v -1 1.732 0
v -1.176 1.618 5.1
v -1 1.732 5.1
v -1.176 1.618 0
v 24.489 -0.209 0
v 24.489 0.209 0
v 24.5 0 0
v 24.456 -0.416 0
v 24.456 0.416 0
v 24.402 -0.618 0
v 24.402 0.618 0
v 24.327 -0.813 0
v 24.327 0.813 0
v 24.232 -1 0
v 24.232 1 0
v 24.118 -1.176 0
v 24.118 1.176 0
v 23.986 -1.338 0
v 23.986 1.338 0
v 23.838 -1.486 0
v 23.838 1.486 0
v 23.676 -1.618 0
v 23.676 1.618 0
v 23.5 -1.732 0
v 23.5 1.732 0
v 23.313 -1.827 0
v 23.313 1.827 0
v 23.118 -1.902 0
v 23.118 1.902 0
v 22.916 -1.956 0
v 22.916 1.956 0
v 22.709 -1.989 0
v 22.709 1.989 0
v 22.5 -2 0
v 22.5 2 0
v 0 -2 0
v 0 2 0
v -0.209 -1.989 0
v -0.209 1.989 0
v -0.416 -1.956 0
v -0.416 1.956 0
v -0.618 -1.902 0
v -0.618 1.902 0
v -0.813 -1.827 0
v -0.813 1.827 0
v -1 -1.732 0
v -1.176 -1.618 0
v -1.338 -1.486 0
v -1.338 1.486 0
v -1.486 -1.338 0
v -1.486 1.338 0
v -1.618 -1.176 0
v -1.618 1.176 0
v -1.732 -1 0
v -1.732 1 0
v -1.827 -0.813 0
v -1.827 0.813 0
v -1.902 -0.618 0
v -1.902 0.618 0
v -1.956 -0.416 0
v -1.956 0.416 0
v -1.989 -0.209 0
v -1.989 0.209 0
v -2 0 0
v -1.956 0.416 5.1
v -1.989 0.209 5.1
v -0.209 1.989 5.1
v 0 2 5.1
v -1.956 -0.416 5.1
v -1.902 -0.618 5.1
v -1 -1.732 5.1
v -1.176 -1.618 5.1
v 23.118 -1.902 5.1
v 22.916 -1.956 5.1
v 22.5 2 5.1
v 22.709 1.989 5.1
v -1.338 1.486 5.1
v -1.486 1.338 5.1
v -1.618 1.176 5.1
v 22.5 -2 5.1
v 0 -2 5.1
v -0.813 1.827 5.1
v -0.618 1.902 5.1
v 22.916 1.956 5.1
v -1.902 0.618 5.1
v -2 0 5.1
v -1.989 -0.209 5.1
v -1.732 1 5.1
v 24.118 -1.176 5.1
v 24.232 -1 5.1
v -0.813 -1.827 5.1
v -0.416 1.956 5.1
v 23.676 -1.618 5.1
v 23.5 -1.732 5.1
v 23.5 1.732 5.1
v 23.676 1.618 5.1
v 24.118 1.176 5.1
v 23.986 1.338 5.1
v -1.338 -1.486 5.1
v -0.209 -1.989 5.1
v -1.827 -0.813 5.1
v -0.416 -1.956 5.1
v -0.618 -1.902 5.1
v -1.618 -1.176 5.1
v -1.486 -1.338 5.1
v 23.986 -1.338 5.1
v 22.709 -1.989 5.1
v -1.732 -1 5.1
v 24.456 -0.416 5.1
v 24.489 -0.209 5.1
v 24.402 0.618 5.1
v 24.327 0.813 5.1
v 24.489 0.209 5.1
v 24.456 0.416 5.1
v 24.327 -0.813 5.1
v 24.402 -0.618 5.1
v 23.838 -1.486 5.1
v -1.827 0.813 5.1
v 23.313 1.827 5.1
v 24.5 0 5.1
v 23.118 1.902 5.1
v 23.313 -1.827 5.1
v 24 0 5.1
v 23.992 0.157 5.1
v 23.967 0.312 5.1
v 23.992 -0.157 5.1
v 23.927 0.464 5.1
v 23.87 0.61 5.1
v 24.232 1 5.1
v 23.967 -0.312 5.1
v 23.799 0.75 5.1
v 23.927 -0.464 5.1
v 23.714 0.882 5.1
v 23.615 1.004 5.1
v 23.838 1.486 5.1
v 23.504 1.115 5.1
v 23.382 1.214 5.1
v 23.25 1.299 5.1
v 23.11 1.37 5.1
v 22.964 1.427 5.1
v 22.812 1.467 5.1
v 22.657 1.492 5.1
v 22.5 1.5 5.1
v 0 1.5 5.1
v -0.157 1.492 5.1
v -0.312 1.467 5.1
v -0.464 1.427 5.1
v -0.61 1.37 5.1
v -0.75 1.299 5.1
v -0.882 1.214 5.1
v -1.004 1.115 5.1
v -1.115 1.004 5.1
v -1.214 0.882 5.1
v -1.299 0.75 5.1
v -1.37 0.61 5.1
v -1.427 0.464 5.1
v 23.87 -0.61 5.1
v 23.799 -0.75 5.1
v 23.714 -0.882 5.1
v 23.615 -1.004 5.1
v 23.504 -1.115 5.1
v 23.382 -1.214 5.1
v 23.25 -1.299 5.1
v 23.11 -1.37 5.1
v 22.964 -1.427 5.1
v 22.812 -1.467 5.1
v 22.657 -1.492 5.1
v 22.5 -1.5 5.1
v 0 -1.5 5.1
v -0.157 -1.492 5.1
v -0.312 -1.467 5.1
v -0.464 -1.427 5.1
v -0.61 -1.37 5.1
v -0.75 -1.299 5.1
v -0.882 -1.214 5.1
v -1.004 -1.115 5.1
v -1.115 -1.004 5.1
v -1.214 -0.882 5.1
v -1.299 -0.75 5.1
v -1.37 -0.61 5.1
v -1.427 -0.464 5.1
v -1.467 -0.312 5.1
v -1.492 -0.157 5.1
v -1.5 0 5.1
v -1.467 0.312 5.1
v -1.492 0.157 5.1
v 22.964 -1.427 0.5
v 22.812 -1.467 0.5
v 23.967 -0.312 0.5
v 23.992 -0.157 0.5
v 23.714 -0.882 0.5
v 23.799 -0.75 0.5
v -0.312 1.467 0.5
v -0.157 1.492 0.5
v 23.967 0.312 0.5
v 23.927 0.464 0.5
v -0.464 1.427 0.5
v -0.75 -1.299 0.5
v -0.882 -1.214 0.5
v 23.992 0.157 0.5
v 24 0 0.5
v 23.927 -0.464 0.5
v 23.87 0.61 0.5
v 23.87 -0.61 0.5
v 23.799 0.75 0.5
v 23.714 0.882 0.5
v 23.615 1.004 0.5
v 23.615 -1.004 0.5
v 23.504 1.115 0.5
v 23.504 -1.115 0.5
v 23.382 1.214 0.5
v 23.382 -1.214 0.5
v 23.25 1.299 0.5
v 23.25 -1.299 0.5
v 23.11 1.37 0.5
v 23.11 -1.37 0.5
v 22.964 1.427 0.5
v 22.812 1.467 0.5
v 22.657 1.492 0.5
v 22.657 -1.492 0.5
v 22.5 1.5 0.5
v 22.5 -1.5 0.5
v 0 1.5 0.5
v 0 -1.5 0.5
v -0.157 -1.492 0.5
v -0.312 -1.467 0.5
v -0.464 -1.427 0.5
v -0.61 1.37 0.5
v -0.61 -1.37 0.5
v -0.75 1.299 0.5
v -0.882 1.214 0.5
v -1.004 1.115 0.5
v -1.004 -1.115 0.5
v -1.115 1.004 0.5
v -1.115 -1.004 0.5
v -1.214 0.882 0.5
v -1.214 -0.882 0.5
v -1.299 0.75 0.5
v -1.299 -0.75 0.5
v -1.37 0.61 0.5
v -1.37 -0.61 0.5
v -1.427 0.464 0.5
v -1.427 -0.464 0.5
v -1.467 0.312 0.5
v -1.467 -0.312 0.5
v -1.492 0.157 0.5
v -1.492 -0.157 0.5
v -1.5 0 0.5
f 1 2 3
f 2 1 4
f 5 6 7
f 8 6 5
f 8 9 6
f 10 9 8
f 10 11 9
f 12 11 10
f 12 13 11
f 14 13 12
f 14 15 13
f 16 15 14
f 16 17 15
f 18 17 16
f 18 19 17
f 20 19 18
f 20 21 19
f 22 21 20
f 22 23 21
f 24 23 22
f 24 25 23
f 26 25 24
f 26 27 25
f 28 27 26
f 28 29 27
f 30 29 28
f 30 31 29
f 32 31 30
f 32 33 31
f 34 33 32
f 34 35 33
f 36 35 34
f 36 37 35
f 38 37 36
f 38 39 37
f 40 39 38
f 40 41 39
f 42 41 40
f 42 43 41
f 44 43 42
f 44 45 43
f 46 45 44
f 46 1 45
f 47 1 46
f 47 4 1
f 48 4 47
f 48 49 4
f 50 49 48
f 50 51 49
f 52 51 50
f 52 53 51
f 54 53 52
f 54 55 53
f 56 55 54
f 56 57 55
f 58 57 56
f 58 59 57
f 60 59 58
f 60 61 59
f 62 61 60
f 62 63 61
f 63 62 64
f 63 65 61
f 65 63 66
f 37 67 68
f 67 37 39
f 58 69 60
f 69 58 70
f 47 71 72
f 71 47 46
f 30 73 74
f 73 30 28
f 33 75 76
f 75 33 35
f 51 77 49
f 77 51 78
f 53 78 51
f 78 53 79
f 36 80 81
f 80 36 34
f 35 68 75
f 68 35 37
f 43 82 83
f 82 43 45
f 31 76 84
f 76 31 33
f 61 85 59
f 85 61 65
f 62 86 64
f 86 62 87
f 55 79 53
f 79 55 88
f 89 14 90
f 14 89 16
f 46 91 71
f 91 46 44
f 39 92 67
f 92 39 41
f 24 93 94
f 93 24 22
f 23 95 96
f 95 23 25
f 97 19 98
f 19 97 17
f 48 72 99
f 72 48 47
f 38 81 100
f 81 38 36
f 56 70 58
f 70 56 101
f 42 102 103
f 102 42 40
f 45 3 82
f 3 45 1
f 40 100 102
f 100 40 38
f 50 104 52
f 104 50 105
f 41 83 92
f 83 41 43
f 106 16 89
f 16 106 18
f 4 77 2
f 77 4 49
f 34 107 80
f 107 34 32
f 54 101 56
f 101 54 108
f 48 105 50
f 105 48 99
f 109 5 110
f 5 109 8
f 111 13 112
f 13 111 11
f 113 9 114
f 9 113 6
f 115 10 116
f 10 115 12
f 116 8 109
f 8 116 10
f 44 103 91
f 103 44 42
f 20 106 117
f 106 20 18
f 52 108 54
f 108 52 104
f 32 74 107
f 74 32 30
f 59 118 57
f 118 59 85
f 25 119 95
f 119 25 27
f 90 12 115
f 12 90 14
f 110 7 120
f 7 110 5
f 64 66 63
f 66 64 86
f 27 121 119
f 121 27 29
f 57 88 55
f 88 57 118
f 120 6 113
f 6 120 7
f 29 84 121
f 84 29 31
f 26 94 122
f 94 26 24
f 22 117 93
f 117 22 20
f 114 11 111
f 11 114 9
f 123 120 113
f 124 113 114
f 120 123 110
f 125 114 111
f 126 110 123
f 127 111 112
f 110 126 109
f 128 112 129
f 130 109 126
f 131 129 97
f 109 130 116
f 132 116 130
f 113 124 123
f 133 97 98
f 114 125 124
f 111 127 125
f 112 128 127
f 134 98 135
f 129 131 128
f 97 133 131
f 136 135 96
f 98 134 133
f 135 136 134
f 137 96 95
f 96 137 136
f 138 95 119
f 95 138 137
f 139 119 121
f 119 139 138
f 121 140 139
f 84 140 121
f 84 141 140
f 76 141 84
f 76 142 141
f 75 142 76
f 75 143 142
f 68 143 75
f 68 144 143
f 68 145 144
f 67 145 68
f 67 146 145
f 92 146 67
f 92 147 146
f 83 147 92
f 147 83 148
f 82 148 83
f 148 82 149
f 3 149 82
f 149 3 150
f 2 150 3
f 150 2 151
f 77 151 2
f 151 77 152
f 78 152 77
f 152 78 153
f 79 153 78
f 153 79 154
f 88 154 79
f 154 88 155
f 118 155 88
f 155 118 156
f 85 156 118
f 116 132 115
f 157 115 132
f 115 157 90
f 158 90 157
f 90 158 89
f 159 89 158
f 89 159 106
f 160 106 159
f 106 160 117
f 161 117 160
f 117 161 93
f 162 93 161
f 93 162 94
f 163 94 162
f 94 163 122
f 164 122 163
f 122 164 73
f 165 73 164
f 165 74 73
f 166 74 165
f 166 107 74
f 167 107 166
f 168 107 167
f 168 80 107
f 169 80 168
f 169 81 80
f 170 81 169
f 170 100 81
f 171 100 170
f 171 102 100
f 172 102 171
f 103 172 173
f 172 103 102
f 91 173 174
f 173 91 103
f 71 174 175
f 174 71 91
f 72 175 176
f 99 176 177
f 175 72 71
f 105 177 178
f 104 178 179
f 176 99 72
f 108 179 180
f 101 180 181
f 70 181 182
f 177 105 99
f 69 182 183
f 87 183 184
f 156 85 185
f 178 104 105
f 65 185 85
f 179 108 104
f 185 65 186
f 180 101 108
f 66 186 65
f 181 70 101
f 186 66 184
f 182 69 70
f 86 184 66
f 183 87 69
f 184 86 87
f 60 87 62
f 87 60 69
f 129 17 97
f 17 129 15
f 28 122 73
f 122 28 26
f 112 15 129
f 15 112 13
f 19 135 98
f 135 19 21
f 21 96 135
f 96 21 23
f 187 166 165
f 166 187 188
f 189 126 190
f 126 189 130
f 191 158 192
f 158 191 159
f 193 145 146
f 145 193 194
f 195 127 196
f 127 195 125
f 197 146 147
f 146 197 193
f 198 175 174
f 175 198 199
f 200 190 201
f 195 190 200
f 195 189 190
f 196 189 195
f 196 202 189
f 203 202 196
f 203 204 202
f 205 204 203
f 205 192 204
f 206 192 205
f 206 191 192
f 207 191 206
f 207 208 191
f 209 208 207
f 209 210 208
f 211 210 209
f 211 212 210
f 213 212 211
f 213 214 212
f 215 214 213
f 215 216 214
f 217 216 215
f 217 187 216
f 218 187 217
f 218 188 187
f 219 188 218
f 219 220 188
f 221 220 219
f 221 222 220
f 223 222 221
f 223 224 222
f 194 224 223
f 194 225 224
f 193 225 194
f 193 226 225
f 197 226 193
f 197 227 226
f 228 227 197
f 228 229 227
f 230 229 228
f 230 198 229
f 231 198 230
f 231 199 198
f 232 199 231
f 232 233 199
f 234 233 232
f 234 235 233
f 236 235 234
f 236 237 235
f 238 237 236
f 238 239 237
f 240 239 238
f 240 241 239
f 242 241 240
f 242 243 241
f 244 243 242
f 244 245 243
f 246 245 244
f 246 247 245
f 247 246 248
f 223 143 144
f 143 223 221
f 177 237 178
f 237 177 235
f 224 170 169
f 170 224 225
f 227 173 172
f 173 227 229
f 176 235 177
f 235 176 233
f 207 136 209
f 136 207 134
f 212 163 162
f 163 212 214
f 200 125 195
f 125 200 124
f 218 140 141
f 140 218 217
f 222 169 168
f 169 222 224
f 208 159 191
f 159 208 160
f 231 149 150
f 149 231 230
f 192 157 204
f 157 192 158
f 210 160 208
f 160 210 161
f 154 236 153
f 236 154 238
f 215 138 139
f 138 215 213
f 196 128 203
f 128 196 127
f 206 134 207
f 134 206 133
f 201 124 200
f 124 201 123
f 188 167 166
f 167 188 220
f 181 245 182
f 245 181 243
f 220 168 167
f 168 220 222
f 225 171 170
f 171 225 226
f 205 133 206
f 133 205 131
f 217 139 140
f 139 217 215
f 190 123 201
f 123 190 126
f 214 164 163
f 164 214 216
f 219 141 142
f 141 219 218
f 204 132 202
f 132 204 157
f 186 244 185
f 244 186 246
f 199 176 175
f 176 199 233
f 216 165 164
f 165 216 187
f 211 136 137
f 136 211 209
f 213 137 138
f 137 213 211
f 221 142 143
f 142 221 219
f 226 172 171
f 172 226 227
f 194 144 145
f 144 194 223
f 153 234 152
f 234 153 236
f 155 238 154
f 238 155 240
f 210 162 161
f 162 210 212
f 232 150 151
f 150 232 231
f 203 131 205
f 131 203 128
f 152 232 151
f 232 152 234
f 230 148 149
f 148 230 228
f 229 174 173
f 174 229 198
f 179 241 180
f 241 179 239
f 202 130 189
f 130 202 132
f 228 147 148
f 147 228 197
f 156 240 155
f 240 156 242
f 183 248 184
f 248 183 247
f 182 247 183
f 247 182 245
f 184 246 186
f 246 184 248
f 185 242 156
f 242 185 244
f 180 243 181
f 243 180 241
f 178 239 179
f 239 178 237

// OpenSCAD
// =================================================================
// TUF PROTECTIVE ELASTOMER CAP
// High-Tensile Synthetic Elastomer
// =================================================================
$fn = 60;

// Dimensions for the 22mm x 2.4mm M.2 fractured edge
cap_w = 22.5; 
cap_h = 3.0;
cap_d = 5.0; // Depth of the seal
wall_thick = 0.5;

module protective_cap() {
    difference() {
        // Outer dimensions of the cap
        hull() {
            translate([0, 0, 0]) cylinder(h=cap_d, r=2);
            translate([cap_w, 0, 0]) cylinder(h=cap_d, r=2);
            translate([0, 0, cap_d]) cylinder(h=0.1, r=2);
            translate([cap_w, 0, cap_d]) cylinder(h=0.1, r=2);
        }
        
        // Internal hollow to receive the fractured board edge
        translate([0, 0, wall_thick])
        hull() {
            translate([0, 0, 0]) cylinder(h=cap_d, r=1.5);
            translate([cap_w, 0, 0]) cylinder(h=cap_d, r=1.5);
        }
    }
}

protective_cap();
